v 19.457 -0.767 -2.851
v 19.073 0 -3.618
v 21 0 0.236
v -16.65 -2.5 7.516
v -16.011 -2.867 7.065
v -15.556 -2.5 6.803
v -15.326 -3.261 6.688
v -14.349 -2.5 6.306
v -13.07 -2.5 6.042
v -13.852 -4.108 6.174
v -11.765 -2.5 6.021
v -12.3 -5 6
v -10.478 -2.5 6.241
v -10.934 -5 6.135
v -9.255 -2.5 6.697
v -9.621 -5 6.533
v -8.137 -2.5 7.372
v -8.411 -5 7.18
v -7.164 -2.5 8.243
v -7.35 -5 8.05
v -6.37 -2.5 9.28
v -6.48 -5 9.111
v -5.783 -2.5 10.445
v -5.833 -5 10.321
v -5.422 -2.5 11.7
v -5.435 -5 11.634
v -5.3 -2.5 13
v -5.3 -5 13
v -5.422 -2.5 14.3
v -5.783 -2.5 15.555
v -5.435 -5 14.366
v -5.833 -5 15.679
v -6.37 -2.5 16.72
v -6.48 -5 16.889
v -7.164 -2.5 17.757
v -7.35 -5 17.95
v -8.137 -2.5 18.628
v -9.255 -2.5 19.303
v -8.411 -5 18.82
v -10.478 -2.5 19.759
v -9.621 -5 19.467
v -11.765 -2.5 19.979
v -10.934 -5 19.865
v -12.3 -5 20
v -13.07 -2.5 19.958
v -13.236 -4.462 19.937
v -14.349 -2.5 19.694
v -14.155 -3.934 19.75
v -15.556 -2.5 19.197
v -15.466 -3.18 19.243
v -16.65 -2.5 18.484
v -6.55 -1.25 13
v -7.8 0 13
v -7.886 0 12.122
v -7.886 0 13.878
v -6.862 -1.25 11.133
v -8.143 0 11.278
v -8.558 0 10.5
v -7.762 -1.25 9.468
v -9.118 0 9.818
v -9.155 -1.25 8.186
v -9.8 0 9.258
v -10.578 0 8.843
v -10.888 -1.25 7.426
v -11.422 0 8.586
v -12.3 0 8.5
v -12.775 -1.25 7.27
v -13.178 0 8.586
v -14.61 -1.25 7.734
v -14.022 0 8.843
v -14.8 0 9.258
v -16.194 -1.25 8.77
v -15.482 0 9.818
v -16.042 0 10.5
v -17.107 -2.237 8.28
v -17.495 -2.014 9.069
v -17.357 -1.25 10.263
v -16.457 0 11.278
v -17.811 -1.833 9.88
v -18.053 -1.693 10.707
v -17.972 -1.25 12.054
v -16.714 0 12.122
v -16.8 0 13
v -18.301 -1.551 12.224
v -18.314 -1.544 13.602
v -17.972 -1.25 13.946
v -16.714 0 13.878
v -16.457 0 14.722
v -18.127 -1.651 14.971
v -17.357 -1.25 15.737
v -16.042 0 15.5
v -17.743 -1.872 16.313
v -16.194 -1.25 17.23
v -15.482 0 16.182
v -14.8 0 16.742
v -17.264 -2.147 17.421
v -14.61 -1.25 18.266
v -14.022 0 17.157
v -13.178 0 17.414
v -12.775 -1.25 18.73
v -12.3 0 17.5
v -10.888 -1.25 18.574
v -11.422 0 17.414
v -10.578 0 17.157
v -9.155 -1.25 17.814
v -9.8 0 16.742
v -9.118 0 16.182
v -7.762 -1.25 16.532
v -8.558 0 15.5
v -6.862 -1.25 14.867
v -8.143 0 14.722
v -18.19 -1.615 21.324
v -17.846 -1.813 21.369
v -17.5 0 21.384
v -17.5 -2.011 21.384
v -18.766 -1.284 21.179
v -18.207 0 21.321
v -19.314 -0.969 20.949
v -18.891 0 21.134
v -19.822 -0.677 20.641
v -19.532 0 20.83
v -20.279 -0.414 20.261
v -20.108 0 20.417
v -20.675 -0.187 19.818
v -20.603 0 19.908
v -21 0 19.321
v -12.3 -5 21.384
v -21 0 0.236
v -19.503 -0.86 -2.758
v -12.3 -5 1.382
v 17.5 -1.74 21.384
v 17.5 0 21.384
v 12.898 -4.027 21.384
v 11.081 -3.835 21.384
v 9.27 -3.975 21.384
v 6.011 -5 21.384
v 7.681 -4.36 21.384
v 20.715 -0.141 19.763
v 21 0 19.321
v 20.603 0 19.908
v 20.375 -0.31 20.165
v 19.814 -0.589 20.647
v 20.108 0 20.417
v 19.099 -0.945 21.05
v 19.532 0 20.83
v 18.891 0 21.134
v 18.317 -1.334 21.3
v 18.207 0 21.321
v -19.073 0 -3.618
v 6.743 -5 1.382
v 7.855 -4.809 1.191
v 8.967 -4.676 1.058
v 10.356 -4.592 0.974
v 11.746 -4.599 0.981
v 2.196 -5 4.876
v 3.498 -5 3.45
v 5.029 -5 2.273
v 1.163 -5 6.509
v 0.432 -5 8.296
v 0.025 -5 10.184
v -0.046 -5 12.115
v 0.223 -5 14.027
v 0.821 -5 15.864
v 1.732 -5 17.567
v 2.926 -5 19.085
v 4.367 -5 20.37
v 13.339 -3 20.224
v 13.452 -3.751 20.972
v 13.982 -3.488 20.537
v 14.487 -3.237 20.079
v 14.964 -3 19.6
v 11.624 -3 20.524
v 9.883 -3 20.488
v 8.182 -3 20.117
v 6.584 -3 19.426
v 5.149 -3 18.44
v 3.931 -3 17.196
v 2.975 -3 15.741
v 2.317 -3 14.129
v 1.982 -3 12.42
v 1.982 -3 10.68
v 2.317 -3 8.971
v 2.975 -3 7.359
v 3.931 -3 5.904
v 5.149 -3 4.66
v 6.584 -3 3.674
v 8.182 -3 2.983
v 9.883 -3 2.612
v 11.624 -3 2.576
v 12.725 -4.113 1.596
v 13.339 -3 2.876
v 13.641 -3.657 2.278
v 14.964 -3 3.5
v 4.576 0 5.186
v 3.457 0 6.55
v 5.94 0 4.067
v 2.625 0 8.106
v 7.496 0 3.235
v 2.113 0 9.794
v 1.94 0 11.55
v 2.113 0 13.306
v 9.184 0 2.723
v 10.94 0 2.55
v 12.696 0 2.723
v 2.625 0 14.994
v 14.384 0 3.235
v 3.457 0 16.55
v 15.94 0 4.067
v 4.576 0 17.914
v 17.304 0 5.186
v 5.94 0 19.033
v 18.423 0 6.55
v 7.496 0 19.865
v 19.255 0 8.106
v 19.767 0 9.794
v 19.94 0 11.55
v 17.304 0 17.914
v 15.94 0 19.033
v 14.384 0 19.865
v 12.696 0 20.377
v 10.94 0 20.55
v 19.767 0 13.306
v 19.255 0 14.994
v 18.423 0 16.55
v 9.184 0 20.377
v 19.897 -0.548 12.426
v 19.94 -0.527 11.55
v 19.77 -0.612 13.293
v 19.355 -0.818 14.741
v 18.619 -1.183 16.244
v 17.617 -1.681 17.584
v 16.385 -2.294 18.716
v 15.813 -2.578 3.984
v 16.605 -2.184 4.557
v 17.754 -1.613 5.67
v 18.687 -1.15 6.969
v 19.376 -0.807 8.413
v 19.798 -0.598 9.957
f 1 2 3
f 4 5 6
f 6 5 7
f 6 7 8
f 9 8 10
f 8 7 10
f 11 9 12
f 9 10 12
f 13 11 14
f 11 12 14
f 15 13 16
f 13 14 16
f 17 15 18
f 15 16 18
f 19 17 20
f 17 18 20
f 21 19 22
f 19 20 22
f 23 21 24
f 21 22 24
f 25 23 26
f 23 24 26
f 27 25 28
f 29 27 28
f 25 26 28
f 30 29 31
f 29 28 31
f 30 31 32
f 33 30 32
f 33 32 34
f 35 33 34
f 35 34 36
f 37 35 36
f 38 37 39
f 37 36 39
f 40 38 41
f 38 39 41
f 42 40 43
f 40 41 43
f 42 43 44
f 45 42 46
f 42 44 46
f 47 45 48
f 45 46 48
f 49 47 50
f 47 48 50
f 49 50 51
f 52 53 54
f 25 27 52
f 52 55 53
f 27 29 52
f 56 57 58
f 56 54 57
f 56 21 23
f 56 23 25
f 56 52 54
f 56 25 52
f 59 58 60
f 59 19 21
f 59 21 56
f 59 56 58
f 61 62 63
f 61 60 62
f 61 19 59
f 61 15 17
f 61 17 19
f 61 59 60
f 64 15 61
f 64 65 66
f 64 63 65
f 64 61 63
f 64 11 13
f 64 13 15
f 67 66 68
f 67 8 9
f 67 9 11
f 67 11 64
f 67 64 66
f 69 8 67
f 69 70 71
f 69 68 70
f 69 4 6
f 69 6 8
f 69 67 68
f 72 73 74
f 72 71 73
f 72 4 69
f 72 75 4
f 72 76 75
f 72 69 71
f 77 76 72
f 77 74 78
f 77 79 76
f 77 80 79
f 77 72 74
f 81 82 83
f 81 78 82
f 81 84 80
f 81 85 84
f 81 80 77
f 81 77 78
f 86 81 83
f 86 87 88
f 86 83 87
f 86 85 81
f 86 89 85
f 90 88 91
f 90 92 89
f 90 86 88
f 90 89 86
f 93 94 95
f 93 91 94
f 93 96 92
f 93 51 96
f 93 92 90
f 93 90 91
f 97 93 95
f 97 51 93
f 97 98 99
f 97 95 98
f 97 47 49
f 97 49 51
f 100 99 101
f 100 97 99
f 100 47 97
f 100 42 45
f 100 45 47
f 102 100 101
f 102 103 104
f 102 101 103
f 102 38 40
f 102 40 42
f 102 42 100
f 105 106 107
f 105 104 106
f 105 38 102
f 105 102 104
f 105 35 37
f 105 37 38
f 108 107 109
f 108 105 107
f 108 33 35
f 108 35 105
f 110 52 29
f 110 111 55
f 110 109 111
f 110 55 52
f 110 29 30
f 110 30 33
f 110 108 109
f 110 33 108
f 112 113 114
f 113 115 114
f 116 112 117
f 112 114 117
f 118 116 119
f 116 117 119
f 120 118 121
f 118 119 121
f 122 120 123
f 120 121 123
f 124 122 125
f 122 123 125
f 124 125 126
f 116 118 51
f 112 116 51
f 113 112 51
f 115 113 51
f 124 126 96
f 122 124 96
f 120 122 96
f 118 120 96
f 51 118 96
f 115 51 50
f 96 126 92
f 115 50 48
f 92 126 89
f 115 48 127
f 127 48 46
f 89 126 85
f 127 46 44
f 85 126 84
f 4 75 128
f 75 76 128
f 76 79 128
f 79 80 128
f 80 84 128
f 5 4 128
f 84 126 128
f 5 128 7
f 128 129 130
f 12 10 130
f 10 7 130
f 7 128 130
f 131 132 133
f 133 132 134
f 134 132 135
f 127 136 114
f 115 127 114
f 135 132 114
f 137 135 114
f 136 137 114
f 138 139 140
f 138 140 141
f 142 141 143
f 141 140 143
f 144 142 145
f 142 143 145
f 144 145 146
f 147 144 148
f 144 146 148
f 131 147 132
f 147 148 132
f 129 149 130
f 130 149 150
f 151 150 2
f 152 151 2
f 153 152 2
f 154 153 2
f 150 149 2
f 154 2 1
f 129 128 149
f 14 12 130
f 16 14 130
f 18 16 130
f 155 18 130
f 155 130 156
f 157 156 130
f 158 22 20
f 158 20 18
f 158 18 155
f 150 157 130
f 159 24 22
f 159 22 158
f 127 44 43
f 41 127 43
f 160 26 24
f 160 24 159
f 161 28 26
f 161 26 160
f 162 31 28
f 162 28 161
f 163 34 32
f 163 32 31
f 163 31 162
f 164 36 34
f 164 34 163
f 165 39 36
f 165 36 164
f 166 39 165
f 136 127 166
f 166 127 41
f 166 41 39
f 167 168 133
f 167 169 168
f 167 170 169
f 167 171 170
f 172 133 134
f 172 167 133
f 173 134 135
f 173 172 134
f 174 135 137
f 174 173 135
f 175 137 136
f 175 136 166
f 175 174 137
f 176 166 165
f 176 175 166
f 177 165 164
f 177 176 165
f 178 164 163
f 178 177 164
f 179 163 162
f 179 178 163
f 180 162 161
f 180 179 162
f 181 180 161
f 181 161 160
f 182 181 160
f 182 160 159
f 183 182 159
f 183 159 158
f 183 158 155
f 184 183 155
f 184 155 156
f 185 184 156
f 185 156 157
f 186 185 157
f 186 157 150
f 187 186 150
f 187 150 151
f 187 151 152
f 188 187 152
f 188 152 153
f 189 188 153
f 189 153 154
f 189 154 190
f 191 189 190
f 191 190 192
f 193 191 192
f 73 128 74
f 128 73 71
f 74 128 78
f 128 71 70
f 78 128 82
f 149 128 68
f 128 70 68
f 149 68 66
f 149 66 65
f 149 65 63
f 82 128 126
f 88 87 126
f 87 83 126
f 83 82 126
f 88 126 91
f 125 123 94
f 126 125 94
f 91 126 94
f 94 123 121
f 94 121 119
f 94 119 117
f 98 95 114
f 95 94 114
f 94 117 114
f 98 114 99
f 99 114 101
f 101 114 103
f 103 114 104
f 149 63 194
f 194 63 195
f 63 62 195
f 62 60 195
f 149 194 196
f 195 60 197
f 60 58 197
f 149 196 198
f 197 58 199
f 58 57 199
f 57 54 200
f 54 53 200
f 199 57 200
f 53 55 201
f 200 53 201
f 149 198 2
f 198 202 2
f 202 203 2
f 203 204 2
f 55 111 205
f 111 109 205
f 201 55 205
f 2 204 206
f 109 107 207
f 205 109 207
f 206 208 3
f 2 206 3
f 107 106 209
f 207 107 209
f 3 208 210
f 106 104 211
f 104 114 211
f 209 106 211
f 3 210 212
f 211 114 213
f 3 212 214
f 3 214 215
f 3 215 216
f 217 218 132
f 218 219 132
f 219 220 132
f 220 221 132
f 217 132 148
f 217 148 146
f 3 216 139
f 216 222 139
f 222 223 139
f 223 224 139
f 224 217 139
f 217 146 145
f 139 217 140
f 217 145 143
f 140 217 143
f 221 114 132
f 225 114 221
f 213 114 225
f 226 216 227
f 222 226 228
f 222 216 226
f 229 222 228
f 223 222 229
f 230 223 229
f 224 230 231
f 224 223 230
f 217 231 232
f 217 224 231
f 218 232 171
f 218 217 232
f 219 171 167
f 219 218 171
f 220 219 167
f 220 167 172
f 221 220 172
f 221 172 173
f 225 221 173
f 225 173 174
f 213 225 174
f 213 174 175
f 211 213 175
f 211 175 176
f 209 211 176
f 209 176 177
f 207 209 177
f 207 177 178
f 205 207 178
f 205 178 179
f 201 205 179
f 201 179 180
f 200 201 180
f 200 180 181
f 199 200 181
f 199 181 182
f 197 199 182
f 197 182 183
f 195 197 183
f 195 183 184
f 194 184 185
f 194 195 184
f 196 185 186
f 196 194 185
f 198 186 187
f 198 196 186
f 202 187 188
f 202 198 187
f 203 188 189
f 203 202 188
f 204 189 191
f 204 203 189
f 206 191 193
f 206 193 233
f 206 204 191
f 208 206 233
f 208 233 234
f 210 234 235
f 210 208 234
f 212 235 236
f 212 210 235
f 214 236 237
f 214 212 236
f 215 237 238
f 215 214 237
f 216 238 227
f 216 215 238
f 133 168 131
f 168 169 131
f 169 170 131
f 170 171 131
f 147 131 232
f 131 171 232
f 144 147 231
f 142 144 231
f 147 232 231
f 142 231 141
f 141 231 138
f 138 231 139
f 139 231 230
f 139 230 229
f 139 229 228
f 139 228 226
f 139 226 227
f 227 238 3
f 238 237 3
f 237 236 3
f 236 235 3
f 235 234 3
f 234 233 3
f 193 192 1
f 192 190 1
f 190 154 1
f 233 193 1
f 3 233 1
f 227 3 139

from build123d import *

# Parameters (mm, degrees)
F1_R        = 4.5
F1_R_2      = 9
F2_DEPTH    = 5
F3_R        = 7
F4_DEPTH    = 2
F6_S5_R     = 7
F6_T6_DEPTH = 12
F8_DEPTH    = 25.002
F11_REACH   = 49.0720678119


# Not quite as in the source:
# - a fillet or chamfer that OpenCascade refuses, or shapes differently, is made with other operations: its cross-section is extruded or revolved along the edge and cut away or added


with BuildPart() as f2:
    # F1 (on Front) → F2 (new body)
    with BuildSketch(Plane.XZ):
        with BuildLine():
            ThreePointArc((-17.5, 21.3840905163), (-19.5315060063, 20.829810085), (-21, 19.3205821894))
            Line((-21, 19.3205821894), (-21, 0.2360721162))
            Line((-21, 0.2360721162), (-19.0729714288, -3.6179094837))
            Line((-19.0729714288, -3.6179094837), (19.0729714288, -3.6179094837))
            Line((19.0729714288, -3.6179094837), (21, 0.2360721162))
            Line((21, 0.2360721162), (21, 19.3205821894))
            ThreePointArc((21, 19.3205821894), (19.5315060063, 20.829810085), (17.5, 21.3840905163))
            Line((17.5, 21.3840905163), (-17.5, 21.3840905163))
        make_face()
        with Locations((-12.3, 13)):
            Circle(F1_R, mode=Mode.SUBTRACT)
        with Locations((10.94, 11.55)):
            Circle(F1_R_2, mode=Mode.SUBTRACT)
    extrude(amount=F2_DEPTH)

    # F3 (on face) → F4 (cut)
    with BuildSketch(Plane.XZ.offset(5)):
        with Locations((-12.3, 13)):
            Circle(F3_R)
    extrude(amount=-F4_DEPTH, mode=Mode.SUBTRACT)

    # F5: chamfer of 2 on 1 edges, made by hand

    # F5_s1 → F5_t2 (revolve, cut)
    with BuildSketch(Plane.XY.offset(11.55)):
        Polygon((21.94, -5), (19.94, -3), (19.94, -5), align=None)
    revolve(axis=Axis((10.94, -5, 11.55), (0, -1, 0)), mode=Mode.SUBTRACT)

    # F6: chamfer of 3 on 1 edges, made by hand


with BuildPart() as f6_tool2:
    # F6_s3 → F6_t4 (revolve)
    with BuildSketch(Plane.XY.offset(13)):
        Polygon((-7.8, 0), (-4.8, -3), (-7.8, -3), align=None)
    revolve(axis=Axis((-12.3, -3, 13), (0, 1, 0)))

    # F6_s5 → F6_t6 (intersect, symmetric)
    with BuildSketch(Plane.XZ.offset(1.5)):
        with Locations((-12.3, 13)):
            Circle(F6_S5_R)
    extrude(amount=F6_T6_DEPTH, both=True, mode=Mode.INTERSECT)


with BuildPart() as f2_1:
    add(f2.part)

    # F6_t1: cut F6_tool2
    add(f6_tool2.part, mode=Mode.SUBTRACT)

    # F7 (on face) → F8 (cut, through all)
    with BuildSketch(Plane(origin=(0, 0, -3.6179094837), x_dir=(1, 0, 0), z_dir=(0, 0, -1))):
        Polygon((-21, 5), (-21, 0), (-12.3, 5), align=None)
        Polygon((21, 5), (10.94, 5), (21, 0), align=None)
    extrude(amount=-F8_DEPTH, mode=Mode.SUBTRACT)

    f11_end = Plane(origin=(-17.3406659547, -2.1030655433, 7.002775246), x_dir=(-0.867013944, 0.4982838759, 0), z_dir=(-0.4982838759, -0.867013944, 0))
    # F10 (on offset) → F11 (cut, up to a plane its end follows)
    with BuildSketch(Plane.YZ.offset(21)):
        Polygon((-5, -3.6179094837), (0, -3.6179094837), (-5, 1.3820905163), align=None)
    f11_long = extrude(amount=-F11_REACH, mode=Mode.PRIVATE)
    add(split(f11_long, bisect_by=f11_end, keep=Keep.BOTTOM, mode=Mode.PRIVATE), mode=Mode.SUBTRACT)


solid = f2_1.part
